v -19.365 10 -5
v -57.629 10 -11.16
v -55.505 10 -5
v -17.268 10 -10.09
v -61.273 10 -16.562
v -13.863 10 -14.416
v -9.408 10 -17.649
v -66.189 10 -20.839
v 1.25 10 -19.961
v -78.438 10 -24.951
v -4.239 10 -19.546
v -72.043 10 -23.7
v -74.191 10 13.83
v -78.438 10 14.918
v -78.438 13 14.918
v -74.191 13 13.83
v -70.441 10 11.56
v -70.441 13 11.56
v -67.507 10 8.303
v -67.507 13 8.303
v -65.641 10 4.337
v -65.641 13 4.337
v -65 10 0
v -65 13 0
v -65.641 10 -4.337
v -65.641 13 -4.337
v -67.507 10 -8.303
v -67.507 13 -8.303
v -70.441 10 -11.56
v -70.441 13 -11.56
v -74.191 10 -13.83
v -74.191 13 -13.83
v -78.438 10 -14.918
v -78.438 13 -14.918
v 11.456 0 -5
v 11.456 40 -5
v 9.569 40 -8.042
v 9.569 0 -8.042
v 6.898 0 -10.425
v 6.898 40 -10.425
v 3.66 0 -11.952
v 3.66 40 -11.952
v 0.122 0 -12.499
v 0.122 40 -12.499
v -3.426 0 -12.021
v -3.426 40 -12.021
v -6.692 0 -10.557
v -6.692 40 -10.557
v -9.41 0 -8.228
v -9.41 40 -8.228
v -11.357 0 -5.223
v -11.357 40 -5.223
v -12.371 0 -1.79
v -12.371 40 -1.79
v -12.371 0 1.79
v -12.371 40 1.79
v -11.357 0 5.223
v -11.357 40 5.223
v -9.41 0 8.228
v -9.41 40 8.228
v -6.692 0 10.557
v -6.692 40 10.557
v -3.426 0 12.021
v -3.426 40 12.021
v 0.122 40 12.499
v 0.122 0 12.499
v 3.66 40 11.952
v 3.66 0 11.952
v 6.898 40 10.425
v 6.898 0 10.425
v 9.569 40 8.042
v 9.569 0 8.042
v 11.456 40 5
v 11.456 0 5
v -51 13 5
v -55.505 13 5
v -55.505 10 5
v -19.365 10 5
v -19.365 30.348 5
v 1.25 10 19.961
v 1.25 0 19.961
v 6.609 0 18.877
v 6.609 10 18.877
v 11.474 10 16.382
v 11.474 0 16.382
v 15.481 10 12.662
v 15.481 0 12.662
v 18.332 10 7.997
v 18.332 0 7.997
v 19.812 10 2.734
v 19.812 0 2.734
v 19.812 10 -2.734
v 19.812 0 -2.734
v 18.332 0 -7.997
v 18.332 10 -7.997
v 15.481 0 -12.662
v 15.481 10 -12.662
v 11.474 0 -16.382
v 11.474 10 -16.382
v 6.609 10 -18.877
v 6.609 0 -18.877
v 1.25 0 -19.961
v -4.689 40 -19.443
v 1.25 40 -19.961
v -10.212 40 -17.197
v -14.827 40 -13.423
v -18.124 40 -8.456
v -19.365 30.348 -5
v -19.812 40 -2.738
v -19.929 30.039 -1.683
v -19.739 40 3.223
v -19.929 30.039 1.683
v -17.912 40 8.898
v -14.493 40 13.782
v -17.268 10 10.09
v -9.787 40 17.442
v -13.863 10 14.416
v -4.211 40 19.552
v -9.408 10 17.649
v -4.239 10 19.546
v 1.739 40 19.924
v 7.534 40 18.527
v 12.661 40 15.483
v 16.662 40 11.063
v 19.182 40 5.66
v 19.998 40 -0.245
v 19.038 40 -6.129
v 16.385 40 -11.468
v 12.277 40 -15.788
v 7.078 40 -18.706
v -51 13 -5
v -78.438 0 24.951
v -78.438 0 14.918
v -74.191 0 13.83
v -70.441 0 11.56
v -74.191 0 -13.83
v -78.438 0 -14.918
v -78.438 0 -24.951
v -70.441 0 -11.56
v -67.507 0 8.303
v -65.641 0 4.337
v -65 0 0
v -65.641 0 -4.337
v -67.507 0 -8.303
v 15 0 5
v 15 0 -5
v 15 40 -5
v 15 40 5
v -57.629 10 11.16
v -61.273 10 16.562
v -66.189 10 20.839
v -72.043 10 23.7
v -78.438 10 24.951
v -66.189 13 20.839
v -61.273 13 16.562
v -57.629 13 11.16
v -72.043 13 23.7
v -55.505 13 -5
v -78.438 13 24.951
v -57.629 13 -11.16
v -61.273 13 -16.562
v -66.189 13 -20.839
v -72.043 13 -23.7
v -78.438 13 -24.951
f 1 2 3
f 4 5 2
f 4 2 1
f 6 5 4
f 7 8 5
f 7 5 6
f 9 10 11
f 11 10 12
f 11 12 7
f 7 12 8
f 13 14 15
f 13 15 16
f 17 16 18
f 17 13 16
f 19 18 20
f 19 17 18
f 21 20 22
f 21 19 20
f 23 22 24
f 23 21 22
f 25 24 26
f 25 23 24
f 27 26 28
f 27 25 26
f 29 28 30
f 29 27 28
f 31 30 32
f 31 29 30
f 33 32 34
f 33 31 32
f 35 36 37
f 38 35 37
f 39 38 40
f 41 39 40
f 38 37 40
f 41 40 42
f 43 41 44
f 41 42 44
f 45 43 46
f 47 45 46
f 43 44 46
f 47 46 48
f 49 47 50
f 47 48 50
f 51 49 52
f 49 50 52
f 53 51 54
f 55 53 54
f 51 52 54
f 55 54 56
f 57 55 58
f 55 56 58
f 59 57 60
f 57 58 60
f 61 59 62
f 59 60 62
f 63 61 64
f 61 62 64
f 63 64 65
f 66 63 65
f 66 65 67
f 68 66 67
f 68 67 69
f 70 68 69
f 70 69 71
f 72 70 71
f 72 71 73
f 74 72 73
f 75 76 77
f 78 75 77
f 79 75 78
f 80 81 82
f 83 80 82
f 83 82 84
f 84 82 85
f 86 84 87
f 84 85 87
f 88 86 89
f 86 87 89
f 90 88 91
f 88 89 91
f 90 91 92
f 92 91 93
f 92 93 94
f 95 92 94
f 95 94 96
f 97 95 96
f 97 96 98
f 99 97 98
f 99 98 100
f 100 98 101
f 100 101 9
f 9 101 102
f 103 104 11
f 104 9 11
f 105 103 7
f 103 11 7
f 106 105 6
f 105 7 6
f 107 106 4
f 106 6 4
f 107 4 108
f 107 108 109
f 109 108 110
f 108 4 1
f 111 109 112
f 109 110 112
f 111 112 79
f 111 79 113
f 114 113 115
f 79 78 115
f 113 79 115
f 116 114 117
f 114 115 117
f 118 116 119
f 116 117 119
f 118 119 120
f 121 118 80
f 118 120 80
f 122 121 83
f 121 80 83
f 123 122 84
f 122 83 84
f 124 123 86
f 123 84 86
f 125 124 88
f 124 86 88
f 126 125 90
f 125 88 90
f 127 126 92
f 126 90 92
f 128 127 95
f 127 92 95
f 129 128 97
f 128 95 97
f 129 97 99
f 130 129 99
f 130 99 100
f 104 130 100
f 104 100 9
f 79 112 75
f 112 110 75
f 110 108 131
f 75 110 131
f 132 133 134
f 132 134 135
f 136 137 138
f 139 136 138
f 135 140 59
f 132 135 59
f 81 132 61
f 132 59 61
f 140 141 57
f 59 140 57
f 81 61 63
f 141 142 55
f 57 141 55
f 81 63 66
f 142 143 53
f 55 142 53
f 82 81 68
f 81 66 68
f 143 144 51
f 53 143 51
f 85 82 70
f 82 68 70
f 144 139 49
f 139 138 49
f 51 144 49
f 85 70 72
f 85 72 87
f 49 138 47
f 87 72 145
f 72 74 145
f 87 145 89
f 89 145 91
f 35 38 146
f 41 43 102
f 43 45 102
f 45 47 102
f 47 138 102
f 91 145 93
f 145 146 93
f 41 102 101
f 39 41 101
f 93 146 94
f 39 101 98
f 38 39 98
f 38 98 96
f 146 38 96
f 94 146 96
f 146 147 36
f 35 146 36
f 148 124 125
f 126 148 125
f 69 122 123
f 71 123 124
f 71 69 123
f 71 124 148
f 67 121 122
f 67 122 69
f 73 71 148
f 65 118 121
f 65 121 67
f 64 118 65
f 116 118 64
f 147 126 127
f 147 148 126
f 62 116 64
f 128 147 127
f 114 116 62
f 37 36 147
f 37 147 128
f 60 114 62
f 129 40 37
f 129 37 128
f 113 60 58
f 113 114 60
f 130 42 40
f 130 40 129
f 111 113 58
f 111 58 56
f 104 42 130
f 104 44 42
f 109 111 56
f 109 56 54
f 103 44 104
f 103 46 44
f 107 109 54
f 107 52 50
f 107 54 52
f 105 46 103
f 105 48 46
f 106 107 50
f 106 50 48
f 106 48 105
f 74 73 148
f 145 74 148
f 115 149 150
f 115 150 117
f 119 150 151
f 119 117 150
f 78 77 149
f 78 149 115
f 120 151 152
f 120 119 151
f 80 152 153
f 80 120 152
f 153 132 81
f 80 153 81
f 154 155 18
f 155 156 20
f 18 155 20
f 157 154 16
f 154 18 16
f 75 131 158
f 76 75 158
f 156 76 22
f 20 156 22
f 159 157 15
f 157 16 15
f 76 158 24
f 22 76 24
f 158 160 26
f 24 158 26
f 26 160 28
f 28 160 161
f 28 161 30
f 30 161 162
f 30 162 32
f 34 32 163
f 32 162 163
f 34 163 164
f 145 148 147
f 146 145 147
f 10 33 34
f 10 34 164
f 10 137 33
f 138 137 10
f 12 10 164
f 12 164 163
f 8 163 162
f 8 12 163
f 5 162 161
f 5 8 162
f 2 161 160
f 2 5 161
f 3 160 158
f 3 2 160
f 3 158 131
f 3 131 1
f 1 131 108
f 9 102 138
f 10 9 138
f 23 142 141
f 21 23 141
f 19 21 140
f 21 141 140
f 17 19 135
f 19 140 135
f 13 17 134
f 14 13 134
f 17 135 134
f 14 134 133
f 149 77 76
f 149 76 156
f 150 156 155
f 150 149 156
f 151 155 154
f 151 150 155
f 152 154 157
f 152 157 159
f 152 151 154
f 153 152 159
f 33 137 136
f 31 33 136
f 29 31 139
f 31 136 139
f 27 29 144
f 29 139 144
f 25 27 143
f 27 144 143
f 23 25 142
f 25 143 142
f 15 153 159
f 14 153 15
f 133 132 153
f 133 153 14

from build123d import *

# Parameters (mm, degrees)
SKETCH_1_R          = 20
EXTRUDE_1_DEPTH     = 10
EXTRUDE_2_DEPTH     = 3
SKETCH_7_R          = 20
EXTRUDE_3_DEPTH     = 30
RIB_START           = -5
RIB_1_DEPTH         = 10
CUT_EXTRUDE_1_DEPTH = 92.515026089


# Read off the part's stored shape, not the designer's step: 筋1
with BuildPart() as part:
    # 草图1 → 凸台-拉伸1 (new body)
    with BuildSketch(Plane(origin=(0, 0, 0), x_dir=(1, 0, 0), z_dir=(0, 1, 0))):
        with BuildLine():
            Line((1.25, 19.960899278), (-78.4375, 24.951124098))
            ThreePointArc((-78.4375, 24.951124098), (-61.778275329, 17.116329922), (-55, 0))
            ThreePointArc((-55, 0), (-61.778275329, -17.116329922), (-78.4375, -24.951124098))
            Line((-78.4375, -24.951124098), (1.25, -19.960899278))
            ThreePointArc((1.25, -19.960899278), (-20, 0), (1.25, 19.960899278))
        make_face()
        with BuildLine():
            ThreePointArc((-55, 0), (-61.778275329, 17.116329922), (-78.4375, 24.951124098))
            Line((-78.4375, 24.951124098), (-78.4375, 14.918397828))
            ThreePointArc((-78.4375, 14.918397828), (-68.854653437, 10.038986503), (-65, 0))
            ThreePointArc((-65, 0), (-68.854653437, -10.038986503), (-78.4375, -14.918397828))
            Line((-78.4375, -14.918397828), (-78.4375, -24.951124098))
            ThreePointArc((-78.4375, -24.951124098), (-61.778275329, -17.116329922), (-55, 0))
        make_face()
        Circle(SKETCH_1_R)
    extrude(amount=EXTRUDE_1_DEPTH)

    # 草图5 → 凸台-拉伸2 (add)
    with BuildSketch(Plane(origin=(0, 10, 0), x_dir=(1, 0, 0), z_dir=(0, 1, 0))):
        with BuildLine():
            ThreePointArc((-78.4375, 24.951124098), (-55, 0), (-78.4375, -24.951124098))
            Line((-78.4375, -24.951124098), (-78.4375, -14.918397828))
            ThreePointArc((-78.4375, -14.918397828), (-65, 0), (-78.4375, 14.918397828))
            Line((-78.4375, 14.918397828), (-78.4375, 24.951124098))
        make_face()
    extrude(amount=EXTRUDE_2_DEPTH)

    # 草图7 → 凸台-拉伸3 (add)
    with BuildSketch(Plane(origin=(0, 10, 0), x_dir=(1, 0, 0), z_dir=(0, 1, 0))):
        with Locations(Location((0, 0, 0), (0, 0, 86.416678302))):
            Circle(SKETCH_7_R)
    extrude(amount=EXTRUDE_3_DEPTH)

    # 筋1 outline → 筋1 (add)
    with BuildSketch(Plane.XY.offset(RIB_START)):
        Polygon((-19.364916731, 30.34827147), (-51, 13), (-57, 13), (-57, 10), (-18, 10), (-18, 31.096774193), align=None)
    extrude(amount=RIB_1_DEPTH)

    # 草图9 → 切除-拉伸1 (cut, through all)
    with BuildSketch(Plane(origin=(0, 40, 0), x_dir=(1, 0, 0), z_dir=(0, 1, 0))):
        with BuildLine():
            Line((0, -5), (0, 5))
            Line((0, 5), (11.456439237, 5))
            ThreePointArc((11.456439237, 5), (-12.5, 0), (11.456439237, -5))
            Line((11.456439237, -5), (0, -5))
        make_face()
        with BuildLine():
            Line((11.456439237, 5), (0, 5))
            Line((0, 5), (0, -5))
            Line((0, -5), (11.456439237, -5))
            ThreePointArc((11.456439237, -5), (12.236328912, -2.553870546), (12.5, 0))
            ThreePointArc((12.5, 0), (12.236328912, 2.553870546), (11.456439237, 5))
        make_face()
        with BuildLine():
            Line((15, 5), (11.456439237, 5))
            ThreePointArc((11.456439237, 5), (12.236328912, 2.553870546), (12.5, 0))
            ThreePointArc((12.5, 0), (12.236328912, -2.553870546), (11.456439237, -5))
            Line((11.456439237, -5), (15, -5))
            Line((15, -5), (15, 5))
        make_face()
    extrude(amount=-CUT_EXTRUDE_1_DEPTH, mode=Mode.SUBTRACT)


solid = part.part
